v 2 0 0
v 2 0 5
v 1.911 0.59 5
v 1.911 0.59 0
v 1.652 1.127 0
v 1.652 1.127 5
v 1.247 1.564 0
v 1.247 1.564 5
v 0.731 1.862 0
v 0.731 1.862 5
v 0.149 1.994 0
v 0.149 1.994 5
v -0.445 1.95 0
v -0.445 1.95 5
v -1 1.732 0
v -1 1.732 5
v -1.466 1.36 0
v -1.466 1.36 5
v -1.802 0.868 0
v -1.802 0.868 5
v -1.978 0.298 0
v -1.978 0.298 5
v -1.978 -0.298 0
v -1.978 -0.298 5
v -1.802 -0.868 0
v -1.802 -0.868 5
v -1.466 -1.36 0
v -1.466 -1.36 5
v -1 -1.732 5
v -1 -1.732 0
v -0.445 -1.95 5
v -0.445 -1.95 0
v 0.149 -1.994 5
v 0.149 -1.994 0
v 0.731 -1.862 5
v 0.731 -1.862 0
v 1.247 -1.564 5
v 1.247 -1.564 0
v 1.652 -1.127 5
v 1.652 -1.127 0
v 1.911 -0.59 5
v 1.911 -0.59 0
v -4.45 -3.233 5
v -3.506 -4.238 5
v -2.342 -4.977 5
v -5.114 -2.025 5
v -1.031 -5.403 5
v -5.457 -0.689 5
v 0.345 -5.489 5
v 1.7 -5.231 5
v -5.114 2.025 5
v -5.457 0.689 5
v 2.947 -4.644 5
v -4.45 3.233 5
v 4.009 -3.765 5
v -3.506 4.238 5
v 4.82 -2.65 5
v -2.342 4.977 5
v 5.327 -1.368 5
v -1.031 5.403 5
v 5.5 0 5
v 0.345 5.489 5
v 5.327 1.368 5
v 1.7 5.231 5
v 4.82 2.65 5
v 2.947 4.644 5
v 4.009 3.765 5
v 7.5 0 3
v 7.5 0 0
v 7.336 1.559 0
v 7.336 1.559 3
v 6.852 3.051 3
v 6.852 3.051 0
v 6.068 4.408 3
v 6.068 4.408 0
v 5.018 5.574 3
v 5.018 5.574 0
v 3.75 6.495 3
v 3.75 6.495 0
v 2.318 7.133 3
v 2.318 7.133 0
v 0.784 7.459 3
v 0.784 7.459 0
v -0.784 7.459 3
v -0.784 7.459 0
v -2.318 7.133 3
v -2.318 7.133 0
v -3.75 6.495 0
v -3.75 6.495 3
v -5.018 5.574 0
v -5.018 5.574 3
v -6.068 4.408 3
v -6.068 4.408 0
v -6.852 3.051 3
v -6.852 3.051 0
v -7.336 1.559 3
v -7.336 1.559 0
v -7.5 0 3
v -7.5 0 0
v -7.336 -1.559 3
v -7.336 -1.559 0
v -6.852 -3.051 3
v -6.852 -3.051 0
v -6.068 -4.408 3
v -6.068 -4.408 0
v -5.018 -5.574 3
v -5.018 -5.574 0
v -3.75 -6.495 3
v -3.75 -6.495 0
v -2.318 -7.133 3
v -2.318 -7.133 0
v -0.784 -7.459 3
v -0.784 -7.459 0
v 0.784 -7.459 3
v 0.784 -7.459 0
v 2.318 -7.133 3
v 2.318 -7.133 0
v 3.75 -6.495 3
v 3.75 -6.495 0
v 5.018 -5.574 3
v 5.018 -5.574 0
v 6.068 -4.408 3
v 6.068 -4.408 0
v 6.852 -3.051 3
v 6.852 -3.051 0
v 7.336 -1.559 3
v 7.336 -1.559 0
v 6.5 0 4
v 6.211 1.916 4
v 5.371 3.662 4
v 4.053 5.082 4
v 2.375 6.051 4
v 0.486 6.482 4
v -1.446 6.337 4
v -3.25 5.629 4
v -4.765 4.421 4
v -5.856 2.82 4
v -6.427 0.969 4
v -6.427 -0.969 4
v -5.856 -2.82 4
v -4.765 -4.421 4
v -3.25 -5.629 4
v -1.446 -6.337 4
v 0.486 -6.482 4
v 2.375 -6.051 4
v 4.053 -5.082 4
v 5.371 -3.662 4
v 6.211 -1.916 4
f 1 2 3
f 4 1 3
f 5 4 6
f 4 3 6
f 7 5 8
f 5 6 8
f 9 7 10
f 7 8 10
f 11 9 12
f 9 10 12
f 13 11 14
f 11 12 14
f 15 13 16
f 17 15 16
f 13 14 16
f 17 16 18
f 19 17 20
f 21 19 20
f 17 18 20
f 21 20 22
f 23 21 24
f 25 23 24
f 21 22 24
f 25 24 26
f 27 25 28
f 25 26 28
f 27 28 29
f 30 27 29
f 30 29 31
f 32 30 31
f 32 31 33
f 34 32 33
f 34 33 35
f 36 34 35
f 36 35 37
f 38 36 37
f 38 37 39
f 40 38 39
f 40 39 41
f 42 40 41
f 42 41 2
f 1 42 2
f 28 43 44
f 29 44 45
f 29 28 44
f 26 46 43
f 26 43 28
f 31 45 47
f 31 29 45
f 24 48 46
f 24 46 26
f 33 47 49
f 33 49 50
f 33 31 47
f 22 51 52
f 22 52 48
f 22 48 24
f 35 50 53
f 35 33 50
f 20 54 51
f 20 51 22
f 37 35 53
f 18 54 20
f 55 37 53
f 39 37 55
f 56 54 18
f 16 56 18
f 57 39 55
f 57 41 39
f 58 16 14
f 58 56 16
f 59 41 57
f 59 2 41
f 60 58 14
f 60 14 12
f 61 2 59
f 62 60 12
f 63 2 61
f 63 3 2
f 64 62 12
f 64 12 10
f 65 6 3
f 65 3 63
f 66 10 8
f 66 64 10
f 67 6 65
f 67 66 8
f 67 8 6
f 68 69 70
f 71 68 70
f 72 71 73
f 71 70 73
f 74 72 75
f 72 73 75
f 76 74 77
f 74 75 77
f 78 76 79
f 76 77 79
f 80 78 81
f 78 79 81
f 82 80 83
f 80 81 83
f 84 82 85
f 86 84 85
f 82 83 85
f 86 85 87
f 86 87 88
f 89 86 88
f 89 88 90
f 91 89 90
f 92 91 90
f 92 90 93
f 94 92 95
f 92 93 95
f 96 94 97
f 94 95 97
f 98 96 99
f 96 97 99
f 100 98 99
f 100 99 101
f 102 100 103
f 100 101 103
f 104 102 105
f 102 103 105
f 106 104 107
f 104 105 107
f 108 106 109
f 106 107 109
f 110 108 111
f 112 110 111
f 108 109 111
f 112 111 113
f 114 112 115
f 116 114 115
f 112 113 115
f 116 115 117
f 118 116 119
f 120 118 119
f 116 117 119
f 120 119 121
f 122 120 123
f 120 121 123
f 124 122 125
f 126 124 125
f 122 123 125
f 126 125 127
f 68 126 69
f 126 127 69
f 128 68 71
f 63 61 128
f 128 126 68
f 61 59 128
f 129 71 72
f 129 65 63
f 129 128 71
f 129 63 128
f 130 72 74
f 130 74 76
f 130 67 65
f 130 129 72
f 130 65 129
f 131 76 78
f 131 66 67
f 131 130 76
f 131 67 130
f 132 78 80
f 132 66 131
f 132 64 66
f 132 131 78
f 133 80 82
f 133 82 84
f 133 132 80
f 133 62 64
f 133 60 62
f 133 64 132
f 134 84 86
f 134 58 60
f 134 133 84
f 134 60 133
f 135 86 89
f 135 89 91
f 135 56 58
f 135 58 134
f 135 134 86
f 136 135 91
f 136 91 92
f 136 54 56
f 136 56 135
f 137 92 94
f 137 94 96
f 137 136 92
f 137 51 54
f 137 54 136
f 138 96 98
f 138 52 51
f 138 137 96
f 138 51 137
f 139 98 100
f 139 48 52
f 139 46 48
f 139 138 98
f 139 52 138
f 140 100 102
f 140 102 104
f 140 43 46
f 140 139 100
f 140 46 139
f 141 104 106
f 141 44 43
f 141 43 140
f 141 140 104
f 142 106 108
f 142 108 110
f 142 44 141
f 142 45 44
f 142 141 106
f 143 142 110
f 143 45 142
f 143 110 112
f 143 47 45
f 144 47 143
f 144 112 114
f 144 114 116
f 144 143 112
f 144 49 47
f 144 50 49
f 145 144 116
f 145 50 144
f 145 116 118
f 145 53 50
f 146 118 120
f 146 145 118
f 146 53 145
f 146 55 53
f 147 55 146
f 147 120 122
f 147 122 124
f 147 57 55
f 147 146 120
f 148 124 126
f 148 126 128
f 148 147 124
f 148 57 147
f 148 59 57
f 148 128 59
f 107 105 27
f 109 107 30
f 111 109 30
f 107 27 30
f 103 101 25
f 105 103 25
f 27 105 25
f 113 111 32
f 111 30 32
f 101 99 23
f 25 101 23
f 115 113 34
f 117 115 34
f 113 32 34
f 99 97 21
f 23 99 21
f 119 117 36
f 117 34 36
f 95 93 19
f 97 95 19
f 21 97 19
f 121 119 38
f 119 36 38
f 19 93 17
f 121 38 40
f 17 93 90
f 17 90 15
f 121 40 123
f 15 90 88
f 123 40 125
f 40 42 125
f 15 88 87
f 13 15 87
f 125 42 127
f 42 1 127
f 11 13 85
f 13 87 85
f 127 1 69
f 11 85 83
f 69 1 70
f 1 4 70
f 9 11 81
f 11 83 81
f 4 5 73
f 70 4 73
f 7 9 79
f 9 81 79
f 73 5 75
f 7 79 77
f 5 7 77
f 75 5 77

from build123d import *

# Parameters (mm, degrees)
F0_R     = 7.5
F1_DEPTH = 5
F2_R     = 2
F3_DEPTH = 25
F4_SIZE  = 2


with BuildPart() as f1:
    # F0 (on Top) → F1 (new body)
    with BuildSketch(Plane.XY):
        Circle(F0_R)
    extrude(amount=F1_DEPTH)

    # F2 (on face) → F3 (cut)
    with BuildSketch(Plane.XY.offset(5)):
        Circle(F2_R)
    extrude(amount=-F3_DEPTH, mode=Mode.SUBTRACT)

    # F4
    f4_edges = [f1.edges().sort_by_distance(p)[0] for p in [
        (-7.5, 0, 5),
    ]]
    chamfer(f4_edges, length=F4_SIZE)


solid = f1.part
